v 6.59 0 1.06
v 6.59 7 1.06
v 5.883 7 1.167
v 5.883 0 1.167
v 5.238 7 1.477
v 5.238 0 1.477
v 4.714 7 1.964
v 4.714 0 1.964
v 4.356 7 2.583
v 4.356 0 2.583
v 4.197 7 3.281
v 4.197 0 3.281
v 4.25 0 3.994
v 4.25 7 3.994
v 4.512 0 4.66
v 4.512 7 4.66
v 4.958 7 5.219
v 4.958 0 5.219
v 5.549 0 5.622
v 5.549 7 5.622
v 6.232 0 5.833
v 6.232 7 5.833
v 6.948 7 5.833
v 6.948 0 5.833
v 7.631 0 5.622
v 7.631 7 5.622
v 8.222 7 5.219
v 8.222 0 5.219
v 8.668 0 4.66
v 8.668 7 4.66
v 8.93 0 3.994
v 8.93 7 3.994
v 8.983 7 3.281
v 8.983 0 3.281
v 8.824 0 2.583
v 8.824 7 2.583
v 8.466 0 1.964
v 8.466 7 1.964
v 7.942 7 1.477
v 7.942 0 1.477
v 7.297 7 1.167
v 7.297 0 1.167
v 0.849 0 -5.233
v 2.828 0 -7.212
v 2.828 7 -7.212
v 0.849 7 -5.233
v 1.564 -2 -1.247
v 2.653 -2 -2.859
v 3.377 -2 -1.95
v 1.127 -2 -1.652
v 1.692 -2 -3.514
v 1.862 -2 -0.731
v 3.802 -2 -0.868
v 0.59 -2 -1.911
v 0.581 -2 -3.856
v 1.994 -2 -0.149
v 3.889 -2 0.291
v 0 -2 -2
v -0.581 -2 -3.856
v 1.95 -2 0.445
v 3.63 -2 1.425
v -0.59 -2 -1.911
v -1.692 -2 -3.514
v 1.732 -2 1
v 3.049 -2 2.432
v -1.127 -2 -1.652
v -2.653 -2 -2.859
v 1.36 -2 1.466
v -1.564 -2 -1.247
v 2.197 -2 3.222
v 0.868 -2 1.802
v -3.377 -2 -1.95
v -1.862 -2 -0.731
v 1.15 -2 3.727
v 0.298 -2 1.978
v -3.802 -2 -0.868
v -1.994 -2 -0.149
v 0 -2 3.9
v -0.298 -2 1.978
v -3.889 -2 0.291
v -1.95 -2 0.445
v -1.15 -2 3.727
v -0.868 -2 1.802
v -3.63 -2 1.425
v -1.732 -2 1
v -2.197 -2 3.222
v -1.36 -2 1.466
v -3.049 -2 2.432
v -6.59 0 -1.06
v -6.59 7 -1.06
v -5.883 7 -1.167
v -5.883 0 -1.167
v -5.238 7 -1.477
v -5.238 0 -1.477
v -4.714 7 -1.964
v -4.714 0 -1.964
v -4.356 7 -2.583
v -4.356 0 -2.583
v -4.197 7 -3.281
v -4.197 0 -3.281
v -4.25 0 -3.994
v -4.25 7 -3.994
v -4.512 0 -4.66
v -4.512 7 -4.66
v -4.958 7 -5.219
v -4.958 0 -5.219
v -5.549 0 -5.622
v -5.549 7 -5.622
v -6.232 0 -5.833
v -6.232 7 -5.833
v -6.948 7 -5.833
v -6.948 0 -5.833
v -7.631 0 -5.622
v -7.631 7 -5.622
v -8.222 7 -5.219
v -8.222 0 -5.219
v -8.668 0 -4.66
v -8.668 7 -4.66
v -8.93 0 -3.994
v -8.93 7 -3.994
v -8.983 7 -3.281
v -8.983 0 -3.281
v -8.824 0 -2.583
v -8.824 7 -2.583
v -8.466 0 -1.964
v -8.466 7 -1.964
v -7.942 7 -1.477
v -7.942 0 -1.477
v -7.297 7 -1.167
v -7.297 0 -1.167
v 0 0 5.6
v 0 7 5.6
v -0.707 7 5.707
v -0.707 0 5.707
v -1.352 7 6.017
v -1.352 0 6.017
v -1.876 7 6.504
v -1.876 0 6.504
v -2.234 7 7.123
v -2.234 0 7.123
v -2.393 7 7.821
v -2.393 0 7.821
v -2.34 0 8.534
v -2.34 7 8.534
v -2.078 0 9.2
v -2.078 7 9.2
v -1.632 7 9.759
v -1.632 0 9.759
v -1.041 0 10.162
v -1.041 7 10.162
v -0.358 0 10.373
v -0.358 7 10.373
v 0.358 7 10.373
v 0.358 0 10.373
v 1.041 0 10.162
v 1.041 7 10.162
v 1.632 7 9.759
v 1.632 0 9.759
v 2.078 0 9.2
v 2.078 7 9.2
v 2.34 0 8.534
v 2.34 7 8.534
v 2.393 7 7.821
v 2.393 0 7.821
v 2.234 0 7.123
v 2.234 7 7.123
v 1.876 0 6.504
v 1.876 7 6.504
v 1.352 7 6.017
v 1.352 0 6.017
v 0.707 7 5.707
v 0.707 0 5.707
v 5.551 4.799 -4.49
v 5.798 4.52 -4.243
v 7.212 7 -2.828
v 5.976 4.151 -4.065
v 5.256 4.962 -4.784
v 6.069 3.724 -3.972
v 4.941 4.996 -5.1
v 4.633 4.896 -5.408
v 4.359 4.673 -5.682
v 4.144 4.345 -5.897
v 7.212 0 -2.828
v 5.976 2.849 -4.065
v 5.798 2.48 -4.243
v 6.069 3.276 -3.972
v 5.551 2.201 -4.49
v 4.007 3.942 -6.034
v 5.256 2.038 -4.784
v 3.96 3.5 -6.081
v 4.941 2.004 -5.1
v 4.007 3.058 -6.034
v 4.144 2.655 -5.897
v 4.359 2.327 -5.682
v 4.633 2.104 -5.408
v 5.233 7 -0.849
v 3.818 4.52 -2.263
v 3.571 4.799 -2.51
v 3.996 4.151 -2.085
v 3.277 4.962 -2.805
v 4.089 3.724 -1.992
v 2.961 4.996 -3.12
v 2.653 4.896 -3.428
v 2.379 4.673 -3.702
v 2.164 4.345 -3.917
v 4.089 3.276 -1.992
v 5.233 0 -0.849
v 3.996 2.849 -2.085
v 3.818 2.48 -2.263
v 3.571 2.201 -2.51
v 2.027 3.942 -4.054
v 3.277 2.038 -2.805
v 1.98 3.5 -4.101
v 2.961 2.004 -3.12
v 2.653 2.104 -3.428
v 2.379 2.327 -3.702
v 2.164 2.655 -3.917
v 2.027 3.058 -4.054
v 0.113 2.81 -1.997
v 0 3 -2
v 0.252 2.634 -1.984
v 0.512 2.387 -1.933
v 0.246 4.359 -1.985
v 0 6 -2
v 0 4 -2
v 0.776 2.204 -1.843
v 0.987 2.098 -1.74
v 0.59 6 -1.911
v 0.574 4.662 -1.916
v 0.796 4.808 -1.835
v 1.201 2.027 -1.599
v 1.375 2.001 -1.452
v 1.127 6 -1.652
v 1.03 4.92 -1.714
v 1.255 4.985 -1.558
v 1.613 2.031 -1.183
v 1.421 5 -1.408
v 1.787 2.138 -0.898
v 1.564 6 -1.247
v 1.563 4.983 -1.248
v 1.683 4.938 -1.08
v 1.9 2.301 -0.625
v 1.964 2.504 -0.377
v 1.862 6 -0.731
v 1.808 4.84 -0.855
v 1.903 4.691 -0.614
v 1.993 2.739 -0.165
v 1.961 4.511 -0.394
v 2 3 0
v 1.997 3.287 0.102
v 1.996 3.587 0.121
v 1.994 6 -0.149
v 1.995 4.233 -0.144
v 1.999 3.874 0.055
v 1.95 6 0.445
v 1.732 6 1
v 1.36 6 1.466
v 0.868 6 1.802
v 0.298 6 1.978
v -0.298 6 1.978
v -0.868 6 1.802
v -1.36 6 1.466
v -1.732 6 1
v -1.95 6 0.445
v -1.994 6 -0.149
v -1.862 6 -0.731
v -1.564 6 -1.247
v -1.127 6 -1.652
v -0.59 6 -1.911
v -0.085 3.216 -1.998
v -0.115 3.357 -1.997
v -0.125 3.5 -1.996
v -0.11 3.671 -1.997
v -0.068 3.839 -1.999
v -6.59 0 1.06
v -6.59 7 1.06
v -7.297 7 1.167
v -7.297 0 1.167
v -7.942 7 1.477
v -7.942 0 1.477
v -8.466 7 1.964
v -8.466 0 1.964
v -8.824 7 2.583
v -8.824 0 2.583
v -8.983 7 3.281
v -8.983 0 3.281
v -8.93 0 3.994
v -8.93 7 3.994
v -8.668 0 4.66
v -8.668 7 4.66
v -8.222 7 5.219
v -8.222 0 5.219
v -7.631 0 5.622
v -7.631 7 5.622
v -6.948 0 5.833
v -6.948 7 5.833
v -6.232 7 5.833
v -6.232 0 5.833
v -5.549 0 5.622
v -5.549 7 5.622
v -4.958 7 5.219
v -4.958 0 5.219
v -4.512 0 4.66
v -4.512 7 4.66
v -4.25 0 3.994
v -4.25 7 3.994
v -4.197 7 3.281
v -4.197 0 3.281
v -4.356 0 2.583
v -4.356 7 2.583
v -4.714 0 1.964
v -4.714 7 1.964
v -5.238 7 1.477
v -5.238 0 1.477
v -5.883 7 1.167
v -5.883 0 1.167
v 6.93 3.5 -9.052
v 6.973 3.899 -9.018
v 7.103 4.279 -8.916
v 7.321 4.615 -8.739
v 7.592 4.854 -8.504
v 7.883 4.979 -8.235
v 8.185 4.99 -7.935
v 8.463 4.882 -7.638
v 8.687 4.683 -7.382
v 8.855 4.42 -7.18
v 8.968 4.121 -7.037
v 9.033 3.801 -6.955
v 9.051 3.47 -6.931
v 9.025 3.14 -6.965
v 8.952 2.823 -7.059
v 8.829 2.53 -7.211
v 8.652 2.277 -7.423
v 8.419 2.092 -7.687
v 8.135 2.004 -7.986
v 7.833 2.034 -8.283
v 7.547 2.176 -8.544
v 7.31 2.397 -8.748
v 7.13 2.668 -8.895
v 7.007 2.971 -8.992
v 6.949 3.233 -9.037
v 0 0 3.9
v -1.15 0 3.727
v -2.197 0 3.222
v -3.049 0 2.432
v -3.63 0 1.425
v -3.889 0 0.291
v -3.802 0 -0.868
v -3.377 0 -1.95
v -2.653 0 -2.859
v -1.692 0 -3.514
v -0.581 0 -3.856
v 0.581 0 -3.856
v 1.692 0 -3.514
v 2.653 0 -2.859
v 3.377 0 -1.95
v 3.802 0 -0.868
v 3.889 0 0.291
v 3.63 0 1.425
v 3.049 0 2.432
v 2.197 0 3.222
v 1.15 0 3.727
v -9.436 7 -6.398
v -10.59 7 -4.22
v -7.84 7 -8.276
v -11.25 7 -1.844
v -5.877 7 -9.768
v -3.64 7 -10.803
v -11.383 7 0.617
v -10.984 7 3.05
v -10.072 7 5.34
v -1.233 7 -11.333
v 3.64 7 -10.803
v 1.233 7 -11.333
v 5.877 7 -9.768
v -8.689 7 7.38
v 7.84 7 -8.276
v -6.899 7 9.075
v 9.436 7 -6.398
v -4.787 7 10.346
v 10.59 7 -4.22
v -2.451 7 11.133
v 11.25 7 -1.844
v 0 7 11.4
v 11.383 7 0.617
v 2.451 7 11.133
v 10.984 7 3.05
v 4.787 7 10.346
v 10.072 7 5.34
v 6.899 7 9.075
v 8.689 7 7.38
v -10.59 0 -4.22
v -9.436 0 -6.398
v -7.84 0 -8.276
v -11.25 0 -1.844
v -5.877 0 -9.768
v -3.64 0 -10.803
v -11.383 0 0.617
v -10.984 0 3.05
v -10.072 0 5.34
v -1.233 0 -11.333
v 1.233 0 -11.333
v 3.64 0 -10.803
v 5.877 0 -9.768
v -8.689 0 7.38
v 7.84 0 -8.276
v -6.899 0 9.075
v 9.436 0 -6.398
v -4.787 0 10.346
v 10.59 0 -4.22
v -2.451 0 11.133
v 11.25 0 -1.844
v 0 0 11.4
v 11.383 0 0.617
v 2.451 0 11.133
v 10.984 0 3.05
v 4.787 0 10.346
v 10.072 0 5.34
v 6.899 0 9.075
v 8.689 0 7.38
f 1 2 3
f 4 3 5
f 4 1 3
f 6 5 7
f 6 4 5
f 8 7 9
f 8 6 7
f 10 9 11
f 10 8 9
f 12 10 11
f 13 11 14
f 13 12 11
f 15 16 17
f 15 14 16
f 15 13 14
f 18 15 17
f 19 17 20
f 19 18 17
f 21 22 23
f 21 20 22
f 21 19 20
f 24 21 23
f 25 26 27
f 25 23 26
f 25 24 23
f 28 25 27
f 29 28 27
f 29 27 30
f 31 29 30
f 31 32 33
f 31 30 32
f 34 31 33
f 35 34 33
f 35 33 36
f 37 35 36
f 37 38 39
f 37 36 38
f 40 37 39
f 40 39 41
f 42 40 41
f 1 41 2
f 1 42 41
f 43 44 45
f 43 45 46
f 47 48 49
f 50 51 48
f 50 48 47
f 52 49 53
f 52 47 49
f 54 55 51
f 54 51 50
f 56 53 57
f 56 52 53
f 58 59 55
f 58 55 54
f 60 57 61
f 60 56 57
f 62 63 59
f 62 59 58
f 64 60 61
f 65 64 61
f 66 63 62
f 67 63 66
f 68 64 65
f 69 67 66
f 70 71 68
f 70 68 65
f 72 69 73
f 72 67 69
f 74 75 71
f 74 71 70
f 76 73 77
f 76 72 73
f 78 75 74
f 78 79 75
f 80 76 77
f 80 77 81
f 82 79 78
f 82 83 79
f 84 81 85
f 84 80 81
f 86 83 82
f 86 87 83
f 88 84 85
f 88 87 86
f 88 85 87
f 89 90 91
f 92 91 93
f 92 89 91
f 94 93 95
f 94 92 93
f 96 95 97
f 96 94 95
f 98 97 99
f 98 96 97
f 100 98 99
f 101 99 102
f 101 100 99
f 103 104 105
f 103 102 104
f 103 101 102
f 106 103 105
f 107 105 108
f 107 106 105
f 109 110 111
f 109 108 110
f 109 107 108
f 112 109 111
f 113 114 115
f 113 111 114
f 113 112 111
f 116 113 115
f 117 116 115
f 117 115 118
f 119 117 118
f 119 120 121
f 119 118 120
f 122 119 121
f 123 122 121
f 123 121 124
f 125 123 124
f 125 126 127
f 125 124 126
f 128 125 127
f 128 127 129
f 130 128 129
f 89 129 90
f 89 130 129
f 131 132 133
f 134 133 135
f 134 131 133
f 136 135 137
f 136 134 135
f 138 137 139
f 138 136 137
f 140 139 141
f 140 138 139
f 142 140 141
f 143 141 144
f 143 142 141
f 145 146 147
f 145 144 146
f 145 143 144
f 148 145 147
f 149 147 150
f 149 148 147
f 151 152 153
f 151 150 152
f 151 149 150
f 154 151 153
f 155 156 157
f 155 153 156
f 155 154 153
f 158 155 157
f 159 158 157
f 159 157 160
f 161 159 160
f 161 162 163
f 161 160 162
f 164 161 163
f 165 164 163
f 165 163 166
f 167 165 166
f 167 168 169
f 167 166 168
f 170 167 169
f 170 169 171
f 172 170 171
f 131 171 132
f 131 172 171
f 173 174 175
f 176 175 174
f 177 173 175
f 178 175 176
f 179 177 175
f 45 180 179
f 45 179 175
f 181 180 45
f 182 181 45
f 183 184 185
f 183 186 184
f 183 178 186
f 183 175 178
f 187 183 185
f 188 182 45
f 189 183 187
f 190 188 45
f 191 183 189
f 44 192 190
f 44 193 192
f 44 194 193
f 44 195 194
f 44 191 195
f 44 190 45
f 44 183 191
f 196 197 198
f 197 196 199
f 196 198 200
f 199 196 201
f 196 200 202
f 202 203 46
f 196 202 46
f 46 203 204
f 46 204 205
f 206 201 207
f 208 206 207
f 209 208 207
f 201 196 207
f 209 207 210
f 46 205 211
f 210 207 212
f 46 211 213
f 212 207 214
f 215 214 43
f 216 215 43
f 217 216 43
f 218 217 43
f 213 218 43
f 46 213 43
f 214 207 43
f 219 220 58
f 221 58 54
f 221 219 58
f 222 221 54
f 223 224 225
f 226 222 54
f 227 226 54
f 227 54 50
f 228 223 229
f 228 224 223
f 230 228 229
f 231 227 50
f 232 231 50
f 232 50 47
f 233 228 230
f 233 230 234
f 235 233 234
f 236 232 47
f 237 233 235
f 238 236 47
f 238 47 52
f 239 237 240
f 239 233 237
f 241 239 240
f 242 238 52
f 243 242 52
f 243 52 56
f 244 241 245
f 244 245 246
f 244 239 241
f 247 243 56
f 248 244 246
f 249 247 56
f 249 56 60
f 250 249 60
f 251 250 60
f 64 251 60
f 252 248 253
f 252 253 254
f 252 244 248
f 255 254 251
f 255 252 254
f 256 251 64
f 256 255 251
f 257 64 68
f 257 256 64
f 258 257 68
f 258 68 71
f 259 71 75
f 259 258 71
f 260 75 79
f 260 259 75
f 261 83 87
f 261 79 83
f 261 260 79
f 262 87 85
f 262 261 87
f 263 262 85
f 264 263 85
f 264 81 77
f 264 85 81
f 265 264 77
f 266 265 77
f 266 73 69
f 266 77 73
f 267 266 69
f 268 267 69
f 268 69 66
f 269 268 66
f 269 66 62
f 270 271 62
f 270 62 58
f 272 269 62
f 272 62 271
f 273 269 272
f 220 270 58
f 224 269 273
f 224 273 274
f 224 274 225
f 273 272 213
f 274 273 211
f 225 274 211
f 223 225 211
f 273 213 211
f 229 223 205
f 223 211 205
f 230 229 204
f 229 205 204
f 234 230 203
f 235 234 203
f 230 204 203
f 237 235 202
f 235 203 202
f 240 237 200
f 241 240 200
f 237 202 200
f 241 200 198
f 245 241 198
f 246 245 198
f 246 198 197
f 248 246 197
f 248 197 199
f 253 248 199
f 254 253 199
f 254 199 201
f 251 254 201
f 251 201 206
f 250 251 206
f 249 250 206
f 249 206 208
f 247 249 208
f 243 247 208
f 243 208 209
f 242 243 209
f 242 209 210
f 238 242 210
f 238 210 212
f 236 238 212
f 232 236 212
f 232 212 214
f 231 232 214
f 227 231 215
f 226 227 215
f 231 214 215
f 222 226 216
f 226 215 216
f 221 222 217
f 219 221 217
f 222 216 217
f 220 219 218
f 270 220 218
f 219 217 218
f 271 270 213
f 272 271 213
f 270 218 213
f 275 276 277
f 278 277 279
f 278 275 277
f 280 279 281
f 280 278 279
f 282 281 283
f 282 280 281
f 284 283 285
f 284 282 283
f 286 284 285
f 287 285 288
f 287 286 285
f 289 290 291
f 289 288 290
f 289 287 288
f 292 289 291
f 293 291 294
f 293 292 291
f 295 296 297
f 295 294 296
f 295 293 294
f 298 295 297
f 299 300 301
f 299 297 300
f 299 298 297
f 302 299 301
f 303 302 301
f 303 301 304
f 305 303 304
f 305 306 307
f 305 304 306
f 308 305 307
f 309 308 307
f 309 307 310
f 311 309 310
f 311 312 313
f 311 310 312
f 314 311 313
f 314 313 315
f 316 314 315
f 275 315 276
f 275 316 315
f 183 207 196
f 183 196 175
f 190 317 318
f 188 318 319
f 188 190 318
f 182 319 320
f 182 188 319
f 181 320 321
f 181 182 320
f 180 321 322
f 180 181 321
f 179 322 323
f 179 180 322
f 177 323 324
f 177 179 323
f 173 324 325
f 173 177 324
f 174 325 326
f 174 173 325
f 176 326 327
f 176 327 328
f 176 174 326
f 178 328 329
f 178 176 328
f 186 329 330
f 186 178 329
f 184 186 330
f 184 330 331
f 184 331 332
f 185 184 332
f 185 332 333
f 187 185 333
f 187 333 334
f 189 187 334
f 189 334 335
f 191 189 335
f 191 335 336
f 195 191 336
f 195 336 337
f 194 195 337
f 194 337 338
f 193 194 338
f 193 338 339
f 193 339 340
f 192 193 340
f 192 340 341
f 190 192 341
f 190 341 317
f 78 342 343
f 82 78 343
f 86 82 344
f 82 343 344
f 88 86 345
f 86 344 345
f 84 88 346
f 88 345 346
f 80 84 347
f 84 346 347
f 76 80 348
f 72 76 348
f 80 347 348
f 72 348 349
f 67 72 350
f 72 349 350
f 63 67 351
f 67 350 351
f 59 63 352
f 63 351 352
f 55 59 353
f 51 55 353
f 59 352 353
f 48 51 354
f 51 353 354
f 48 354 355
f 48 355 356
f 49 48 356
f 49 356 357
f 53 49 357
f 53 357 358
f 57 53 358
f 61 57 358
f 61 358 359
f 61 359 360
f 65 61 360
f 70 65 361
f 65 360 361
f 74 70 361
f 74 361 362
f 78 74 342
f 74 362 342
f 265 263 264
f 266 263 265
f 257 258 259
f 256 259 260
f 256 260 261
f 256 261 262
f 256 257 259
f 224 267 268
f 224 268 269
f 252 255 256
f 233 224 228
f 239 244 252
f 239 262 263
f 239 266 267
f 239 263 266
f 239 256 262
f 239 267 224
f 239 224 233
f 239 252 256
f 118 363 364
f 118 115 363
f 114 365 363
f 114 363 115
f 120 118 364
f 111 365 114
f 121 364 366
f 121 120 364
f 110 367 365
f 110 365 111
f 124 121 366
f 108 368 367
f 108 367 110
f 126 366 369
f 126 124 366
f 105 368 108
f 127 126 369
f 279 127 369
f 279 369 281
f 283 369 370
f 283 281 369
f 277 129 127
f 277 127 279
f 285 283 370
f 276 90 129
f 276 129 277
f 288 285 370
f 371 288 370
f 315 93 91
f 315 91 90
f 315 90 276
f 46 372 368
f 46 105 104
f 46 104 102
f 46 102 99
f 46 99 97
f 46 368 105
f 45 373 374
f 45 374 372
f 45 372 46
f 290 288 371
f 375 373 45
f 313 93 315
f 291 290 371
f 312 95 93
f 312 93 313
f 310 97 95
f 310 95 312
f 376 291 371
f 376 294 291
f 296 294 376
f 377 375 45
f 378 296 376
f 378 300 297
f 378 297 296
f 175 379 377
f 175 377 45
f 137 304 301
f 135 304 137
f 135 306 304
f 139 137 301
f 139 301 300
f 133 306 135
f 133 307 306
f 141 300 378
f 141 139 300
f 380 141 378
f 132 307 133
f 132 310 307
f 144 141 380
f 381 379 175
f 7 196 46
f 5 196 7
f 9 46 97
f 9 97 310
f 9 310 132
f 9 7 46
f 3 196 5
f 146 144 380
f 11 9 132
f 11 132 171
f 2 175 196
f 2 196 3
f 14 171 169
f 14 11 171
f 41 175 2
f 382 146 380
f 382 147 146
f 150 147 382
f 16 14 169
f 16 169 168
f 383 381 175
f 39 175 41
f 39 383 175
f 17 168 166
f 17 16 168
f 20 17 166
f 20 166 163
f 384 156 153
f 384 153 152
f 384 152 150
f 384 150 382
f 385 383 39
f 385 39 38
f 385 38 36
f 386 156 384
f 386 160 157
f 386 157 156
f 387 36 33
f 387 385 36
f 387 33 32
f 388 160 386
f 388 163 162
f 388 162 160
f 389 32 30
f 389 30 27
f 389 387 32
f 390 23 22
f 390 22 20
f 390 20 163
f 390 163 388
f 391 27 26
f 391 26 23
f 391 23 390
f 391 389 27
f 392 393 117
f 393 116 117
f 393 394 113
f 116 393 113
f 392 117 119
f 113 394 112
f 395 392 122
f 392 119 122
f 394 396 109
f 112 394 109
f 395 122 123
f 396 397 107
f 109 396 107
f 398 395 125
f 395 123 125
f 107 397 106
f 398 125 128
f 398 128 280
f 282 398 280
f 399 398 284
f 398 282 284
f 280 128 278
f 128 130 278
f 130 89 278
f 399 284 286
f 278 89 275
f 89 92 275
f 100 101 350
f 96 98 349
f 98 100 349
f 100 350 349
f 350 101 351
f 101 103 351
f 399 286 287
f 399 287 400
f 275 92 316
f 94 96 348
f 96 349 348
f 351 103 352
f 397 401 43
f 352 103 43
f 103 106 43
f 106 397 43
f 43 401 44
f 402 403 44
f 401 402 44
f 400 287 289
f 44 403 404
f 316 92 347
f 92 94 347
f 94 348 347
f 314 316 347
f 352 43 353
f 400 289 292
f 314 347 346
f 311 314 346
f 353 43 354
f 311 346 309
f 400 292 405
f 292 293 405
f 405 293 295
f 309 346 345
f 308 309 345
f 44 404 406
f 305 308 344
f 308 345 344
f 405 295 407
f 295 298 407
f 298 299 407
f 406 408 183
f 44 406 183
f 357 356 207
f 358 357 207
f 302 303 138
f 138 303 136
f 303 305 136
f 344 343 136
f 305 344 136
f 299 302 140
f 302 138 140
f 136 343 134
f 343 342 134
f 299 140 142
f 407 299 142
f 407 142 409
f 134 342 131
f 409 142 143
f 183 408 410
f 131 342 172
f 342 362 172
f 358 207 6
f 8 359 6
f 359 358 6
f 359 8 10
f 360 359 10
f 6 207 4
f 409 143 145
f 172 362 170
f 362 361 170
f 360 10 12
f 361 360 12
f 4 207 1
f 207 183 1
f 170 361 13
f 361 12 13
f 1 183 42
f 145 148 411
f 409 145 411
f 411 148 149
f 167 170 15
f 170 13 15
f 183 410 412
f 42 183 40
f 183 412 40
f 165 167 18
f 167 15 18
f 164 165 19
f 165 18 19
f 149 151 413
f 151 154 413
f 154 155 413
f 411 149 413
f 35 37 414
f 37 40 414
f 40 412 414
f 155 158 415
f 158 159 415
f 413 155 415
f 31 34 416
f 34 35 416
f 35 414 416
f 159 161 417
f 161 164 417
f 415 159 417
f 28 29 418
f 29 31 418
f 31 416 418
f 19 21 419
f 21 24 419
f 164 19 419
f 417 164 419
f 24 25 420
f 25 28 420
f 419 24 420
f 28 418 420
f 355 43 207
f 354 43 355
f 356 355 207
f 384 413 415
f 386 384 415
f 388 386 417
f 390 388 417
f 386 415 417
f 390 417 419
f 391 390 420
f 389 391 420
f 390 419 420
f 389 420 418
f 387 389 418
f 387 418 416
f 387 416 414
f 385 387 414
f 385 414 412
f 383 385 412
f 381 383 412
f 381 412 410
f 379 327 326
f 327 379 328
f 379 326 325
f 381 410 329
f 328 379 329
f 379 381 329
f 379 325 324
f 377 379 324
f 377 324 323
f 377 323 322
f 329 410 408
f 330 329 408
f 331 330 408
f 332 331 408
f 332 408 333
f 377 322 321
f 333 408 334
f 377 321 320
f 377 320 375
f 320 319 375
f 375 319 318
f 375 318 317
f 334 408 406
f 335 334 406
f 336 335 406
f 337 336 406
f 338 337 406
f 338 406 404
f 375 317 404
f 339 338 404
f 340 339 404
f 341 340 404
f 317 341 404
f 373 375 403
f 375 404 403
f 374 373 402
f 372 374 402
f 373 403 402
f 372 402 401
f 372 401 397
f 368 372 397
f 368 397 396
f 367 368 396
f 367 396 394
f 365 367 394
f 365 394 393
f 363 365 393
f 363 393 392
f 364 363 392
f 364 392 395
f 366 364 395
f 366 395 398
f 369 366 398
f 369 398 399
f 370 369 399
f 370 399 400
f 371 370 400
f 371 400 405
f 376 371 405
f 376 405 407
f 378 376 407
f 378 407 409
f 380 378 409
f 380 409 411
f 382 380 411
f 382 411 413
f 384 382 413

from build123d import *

# Parameters (mm, degrees)
ESBO_O2_R                         = 11.4
RESSALTO_EXTRUS_O3_DEPTH          = 7
ESBO_O1_R                         = 2.4
CORTE_EXTRUS_O4_DEPTH             = 15
ESBO_O6_R                         = 3.9
RESSALTO_EXTRUS_O5_DEPTH          = 2
CORTE_EXTRUS_O7_DEPTH             = 4
CORTE_EXTRUS_O7_DEPTH_BACK        = 6
ESBO_O4_R                         = 2
CORTE_EXTRUS_O8_DEPTH             = 10.5
CORTE_EXTRUS_O9_REACH             = 23.588
ESBO_O8_R                         = 1.5
CORTE_EXTRUS_O9_DIRECTION_2_DEPTH = 22.588411189


with BuildPart() as part:
    # Esboço2 → Ressalto-extrusão3 (new body)
    with BuildSketch(Plane(origin=(0, 0, 0), x_dir=(1, 0, 0), z_dir=(0, 1, 0))):
        with Locations(Location((0, 0, 0), (0, 0, 270))):
            Circle(ESBO_O2_R)
    extrude(amount=RESSALTO_EXTRUS_O3_DEPTH)

    # Esboço1 → Corte-extrusão4 (cut)
    with BuildSketch(Plane(origin=(0, 0, 0), x_dir=(1, 0, 0), z_dir=(0, 1, 0))):
        with Locations(Location((-6.59, 3.46, 0), (0, 0, 270))):
            Circle(ESBO_O1_R)
        with Locations(Location((6.59, -3.46, 0), (0, 0, 90))):
            Circle(ESBO_O1_R)
        with Locations(Location((0, -8, 0), (0, 0, 90))):
            Circle(ESBO_O1_R)
        with Locations(Location((-6.59, -3.46, 0), (0, 0, 90))):
            Circle(ESBO_O1_R)
    extrude(amount=CORTE_EXTRUS_O4_DEPTH, mode=Mode.SUBTRACT)

    # Esboço6 → Ressalto-extrusão5 (add)
    with BuildSketch(Plane.XZ):
        with Locations(Location((0, 0, 0), (0, 0, 90))):
            Circle(ESBO_O6_R)
    extrude(amount=RESSALTO_EXTRUS_O5_DEPTH)

    # Esboço4 → Corte-extrusão7 (cut, two sides: drawn at the far end of the back side and taken through both)
    with BuildSketch(Plane(origin=(0, 0, 0), x_dir=(-1, 0, 0), z_dir=(0, -1, 0)).offset(-CORTE_EXTRUS_O7_DEPTH_BACK)):
        with Locations(Location((0, 0, 0), (0, 0, 90))):
            Circle(ESBO_O4_R)
    extrude(amount=CORTE_EXTRUS_O7_DEPTH + CORTE_EXTRUS_O7_DEPTH_BACK, mode=Mode.SUBTRACT)

    # Esboço7 → Corte-extrusão8 (cut)
    with BuildSketch(Plane.XZ):
        Polygon((7.212489168, -2.828427125), (2.828427125, -7.212489168), (0.848528137, -5.232590181), (3.040559159, -3.040559159), (5.232590181, -0.848528137), align=None)
    extrude(amount=-CORTE_EXTRUS_O8_DEPTH, mode=Mode.SUBTRACT)

    # Esboço8 → Corte-extrusão9 (cut, up to next)
    with BuildSketch(Plane(origin=(3.040559159, 0, -3.040559159), x_dir=(-0.7071067811865475, 0, -0.7071067811865477), z_dir=(0.7071067811865477, 0, -0.7071067811865475)), mode=Mode.PRIVATE) as corte_extrus_o9_sk1:
        with Locations((0, 3.5)):
            Circle(ESBO_O8_R)
    corte_extrus_o9_tool1 = extrude(corte_extrus_o9_sk1.sketch, amount=-CORTE_EXTRUS_O9_REACH, mode=Mode.PRIVATE) & part.part
    add(corte_extrus_o9_tool1.solids().sort_by_distance((3.040559, 3.5, -3.040559))[0], mode=Mode.SUBTRACT)

    # Esboço8 → Corte-extrusão9 direction 2 (cut)
    with BuildSketch(Plane(origin=(3.040559159, 0, -3.040559159), x_dir=(-0.7071067811865475, 0, -0.7071067811865477), z_dir=(0.7071067811865477, 0, -0.7071067811865475))):
        with Locations((0, 3.5)):
            Circle(ESBO_O8_R)
    extrude(amount=CORTE_EXTRUS_O9_DIRECTION_2_DEPTH, mode=Mode.SUBTRACT)


solid = part.part
